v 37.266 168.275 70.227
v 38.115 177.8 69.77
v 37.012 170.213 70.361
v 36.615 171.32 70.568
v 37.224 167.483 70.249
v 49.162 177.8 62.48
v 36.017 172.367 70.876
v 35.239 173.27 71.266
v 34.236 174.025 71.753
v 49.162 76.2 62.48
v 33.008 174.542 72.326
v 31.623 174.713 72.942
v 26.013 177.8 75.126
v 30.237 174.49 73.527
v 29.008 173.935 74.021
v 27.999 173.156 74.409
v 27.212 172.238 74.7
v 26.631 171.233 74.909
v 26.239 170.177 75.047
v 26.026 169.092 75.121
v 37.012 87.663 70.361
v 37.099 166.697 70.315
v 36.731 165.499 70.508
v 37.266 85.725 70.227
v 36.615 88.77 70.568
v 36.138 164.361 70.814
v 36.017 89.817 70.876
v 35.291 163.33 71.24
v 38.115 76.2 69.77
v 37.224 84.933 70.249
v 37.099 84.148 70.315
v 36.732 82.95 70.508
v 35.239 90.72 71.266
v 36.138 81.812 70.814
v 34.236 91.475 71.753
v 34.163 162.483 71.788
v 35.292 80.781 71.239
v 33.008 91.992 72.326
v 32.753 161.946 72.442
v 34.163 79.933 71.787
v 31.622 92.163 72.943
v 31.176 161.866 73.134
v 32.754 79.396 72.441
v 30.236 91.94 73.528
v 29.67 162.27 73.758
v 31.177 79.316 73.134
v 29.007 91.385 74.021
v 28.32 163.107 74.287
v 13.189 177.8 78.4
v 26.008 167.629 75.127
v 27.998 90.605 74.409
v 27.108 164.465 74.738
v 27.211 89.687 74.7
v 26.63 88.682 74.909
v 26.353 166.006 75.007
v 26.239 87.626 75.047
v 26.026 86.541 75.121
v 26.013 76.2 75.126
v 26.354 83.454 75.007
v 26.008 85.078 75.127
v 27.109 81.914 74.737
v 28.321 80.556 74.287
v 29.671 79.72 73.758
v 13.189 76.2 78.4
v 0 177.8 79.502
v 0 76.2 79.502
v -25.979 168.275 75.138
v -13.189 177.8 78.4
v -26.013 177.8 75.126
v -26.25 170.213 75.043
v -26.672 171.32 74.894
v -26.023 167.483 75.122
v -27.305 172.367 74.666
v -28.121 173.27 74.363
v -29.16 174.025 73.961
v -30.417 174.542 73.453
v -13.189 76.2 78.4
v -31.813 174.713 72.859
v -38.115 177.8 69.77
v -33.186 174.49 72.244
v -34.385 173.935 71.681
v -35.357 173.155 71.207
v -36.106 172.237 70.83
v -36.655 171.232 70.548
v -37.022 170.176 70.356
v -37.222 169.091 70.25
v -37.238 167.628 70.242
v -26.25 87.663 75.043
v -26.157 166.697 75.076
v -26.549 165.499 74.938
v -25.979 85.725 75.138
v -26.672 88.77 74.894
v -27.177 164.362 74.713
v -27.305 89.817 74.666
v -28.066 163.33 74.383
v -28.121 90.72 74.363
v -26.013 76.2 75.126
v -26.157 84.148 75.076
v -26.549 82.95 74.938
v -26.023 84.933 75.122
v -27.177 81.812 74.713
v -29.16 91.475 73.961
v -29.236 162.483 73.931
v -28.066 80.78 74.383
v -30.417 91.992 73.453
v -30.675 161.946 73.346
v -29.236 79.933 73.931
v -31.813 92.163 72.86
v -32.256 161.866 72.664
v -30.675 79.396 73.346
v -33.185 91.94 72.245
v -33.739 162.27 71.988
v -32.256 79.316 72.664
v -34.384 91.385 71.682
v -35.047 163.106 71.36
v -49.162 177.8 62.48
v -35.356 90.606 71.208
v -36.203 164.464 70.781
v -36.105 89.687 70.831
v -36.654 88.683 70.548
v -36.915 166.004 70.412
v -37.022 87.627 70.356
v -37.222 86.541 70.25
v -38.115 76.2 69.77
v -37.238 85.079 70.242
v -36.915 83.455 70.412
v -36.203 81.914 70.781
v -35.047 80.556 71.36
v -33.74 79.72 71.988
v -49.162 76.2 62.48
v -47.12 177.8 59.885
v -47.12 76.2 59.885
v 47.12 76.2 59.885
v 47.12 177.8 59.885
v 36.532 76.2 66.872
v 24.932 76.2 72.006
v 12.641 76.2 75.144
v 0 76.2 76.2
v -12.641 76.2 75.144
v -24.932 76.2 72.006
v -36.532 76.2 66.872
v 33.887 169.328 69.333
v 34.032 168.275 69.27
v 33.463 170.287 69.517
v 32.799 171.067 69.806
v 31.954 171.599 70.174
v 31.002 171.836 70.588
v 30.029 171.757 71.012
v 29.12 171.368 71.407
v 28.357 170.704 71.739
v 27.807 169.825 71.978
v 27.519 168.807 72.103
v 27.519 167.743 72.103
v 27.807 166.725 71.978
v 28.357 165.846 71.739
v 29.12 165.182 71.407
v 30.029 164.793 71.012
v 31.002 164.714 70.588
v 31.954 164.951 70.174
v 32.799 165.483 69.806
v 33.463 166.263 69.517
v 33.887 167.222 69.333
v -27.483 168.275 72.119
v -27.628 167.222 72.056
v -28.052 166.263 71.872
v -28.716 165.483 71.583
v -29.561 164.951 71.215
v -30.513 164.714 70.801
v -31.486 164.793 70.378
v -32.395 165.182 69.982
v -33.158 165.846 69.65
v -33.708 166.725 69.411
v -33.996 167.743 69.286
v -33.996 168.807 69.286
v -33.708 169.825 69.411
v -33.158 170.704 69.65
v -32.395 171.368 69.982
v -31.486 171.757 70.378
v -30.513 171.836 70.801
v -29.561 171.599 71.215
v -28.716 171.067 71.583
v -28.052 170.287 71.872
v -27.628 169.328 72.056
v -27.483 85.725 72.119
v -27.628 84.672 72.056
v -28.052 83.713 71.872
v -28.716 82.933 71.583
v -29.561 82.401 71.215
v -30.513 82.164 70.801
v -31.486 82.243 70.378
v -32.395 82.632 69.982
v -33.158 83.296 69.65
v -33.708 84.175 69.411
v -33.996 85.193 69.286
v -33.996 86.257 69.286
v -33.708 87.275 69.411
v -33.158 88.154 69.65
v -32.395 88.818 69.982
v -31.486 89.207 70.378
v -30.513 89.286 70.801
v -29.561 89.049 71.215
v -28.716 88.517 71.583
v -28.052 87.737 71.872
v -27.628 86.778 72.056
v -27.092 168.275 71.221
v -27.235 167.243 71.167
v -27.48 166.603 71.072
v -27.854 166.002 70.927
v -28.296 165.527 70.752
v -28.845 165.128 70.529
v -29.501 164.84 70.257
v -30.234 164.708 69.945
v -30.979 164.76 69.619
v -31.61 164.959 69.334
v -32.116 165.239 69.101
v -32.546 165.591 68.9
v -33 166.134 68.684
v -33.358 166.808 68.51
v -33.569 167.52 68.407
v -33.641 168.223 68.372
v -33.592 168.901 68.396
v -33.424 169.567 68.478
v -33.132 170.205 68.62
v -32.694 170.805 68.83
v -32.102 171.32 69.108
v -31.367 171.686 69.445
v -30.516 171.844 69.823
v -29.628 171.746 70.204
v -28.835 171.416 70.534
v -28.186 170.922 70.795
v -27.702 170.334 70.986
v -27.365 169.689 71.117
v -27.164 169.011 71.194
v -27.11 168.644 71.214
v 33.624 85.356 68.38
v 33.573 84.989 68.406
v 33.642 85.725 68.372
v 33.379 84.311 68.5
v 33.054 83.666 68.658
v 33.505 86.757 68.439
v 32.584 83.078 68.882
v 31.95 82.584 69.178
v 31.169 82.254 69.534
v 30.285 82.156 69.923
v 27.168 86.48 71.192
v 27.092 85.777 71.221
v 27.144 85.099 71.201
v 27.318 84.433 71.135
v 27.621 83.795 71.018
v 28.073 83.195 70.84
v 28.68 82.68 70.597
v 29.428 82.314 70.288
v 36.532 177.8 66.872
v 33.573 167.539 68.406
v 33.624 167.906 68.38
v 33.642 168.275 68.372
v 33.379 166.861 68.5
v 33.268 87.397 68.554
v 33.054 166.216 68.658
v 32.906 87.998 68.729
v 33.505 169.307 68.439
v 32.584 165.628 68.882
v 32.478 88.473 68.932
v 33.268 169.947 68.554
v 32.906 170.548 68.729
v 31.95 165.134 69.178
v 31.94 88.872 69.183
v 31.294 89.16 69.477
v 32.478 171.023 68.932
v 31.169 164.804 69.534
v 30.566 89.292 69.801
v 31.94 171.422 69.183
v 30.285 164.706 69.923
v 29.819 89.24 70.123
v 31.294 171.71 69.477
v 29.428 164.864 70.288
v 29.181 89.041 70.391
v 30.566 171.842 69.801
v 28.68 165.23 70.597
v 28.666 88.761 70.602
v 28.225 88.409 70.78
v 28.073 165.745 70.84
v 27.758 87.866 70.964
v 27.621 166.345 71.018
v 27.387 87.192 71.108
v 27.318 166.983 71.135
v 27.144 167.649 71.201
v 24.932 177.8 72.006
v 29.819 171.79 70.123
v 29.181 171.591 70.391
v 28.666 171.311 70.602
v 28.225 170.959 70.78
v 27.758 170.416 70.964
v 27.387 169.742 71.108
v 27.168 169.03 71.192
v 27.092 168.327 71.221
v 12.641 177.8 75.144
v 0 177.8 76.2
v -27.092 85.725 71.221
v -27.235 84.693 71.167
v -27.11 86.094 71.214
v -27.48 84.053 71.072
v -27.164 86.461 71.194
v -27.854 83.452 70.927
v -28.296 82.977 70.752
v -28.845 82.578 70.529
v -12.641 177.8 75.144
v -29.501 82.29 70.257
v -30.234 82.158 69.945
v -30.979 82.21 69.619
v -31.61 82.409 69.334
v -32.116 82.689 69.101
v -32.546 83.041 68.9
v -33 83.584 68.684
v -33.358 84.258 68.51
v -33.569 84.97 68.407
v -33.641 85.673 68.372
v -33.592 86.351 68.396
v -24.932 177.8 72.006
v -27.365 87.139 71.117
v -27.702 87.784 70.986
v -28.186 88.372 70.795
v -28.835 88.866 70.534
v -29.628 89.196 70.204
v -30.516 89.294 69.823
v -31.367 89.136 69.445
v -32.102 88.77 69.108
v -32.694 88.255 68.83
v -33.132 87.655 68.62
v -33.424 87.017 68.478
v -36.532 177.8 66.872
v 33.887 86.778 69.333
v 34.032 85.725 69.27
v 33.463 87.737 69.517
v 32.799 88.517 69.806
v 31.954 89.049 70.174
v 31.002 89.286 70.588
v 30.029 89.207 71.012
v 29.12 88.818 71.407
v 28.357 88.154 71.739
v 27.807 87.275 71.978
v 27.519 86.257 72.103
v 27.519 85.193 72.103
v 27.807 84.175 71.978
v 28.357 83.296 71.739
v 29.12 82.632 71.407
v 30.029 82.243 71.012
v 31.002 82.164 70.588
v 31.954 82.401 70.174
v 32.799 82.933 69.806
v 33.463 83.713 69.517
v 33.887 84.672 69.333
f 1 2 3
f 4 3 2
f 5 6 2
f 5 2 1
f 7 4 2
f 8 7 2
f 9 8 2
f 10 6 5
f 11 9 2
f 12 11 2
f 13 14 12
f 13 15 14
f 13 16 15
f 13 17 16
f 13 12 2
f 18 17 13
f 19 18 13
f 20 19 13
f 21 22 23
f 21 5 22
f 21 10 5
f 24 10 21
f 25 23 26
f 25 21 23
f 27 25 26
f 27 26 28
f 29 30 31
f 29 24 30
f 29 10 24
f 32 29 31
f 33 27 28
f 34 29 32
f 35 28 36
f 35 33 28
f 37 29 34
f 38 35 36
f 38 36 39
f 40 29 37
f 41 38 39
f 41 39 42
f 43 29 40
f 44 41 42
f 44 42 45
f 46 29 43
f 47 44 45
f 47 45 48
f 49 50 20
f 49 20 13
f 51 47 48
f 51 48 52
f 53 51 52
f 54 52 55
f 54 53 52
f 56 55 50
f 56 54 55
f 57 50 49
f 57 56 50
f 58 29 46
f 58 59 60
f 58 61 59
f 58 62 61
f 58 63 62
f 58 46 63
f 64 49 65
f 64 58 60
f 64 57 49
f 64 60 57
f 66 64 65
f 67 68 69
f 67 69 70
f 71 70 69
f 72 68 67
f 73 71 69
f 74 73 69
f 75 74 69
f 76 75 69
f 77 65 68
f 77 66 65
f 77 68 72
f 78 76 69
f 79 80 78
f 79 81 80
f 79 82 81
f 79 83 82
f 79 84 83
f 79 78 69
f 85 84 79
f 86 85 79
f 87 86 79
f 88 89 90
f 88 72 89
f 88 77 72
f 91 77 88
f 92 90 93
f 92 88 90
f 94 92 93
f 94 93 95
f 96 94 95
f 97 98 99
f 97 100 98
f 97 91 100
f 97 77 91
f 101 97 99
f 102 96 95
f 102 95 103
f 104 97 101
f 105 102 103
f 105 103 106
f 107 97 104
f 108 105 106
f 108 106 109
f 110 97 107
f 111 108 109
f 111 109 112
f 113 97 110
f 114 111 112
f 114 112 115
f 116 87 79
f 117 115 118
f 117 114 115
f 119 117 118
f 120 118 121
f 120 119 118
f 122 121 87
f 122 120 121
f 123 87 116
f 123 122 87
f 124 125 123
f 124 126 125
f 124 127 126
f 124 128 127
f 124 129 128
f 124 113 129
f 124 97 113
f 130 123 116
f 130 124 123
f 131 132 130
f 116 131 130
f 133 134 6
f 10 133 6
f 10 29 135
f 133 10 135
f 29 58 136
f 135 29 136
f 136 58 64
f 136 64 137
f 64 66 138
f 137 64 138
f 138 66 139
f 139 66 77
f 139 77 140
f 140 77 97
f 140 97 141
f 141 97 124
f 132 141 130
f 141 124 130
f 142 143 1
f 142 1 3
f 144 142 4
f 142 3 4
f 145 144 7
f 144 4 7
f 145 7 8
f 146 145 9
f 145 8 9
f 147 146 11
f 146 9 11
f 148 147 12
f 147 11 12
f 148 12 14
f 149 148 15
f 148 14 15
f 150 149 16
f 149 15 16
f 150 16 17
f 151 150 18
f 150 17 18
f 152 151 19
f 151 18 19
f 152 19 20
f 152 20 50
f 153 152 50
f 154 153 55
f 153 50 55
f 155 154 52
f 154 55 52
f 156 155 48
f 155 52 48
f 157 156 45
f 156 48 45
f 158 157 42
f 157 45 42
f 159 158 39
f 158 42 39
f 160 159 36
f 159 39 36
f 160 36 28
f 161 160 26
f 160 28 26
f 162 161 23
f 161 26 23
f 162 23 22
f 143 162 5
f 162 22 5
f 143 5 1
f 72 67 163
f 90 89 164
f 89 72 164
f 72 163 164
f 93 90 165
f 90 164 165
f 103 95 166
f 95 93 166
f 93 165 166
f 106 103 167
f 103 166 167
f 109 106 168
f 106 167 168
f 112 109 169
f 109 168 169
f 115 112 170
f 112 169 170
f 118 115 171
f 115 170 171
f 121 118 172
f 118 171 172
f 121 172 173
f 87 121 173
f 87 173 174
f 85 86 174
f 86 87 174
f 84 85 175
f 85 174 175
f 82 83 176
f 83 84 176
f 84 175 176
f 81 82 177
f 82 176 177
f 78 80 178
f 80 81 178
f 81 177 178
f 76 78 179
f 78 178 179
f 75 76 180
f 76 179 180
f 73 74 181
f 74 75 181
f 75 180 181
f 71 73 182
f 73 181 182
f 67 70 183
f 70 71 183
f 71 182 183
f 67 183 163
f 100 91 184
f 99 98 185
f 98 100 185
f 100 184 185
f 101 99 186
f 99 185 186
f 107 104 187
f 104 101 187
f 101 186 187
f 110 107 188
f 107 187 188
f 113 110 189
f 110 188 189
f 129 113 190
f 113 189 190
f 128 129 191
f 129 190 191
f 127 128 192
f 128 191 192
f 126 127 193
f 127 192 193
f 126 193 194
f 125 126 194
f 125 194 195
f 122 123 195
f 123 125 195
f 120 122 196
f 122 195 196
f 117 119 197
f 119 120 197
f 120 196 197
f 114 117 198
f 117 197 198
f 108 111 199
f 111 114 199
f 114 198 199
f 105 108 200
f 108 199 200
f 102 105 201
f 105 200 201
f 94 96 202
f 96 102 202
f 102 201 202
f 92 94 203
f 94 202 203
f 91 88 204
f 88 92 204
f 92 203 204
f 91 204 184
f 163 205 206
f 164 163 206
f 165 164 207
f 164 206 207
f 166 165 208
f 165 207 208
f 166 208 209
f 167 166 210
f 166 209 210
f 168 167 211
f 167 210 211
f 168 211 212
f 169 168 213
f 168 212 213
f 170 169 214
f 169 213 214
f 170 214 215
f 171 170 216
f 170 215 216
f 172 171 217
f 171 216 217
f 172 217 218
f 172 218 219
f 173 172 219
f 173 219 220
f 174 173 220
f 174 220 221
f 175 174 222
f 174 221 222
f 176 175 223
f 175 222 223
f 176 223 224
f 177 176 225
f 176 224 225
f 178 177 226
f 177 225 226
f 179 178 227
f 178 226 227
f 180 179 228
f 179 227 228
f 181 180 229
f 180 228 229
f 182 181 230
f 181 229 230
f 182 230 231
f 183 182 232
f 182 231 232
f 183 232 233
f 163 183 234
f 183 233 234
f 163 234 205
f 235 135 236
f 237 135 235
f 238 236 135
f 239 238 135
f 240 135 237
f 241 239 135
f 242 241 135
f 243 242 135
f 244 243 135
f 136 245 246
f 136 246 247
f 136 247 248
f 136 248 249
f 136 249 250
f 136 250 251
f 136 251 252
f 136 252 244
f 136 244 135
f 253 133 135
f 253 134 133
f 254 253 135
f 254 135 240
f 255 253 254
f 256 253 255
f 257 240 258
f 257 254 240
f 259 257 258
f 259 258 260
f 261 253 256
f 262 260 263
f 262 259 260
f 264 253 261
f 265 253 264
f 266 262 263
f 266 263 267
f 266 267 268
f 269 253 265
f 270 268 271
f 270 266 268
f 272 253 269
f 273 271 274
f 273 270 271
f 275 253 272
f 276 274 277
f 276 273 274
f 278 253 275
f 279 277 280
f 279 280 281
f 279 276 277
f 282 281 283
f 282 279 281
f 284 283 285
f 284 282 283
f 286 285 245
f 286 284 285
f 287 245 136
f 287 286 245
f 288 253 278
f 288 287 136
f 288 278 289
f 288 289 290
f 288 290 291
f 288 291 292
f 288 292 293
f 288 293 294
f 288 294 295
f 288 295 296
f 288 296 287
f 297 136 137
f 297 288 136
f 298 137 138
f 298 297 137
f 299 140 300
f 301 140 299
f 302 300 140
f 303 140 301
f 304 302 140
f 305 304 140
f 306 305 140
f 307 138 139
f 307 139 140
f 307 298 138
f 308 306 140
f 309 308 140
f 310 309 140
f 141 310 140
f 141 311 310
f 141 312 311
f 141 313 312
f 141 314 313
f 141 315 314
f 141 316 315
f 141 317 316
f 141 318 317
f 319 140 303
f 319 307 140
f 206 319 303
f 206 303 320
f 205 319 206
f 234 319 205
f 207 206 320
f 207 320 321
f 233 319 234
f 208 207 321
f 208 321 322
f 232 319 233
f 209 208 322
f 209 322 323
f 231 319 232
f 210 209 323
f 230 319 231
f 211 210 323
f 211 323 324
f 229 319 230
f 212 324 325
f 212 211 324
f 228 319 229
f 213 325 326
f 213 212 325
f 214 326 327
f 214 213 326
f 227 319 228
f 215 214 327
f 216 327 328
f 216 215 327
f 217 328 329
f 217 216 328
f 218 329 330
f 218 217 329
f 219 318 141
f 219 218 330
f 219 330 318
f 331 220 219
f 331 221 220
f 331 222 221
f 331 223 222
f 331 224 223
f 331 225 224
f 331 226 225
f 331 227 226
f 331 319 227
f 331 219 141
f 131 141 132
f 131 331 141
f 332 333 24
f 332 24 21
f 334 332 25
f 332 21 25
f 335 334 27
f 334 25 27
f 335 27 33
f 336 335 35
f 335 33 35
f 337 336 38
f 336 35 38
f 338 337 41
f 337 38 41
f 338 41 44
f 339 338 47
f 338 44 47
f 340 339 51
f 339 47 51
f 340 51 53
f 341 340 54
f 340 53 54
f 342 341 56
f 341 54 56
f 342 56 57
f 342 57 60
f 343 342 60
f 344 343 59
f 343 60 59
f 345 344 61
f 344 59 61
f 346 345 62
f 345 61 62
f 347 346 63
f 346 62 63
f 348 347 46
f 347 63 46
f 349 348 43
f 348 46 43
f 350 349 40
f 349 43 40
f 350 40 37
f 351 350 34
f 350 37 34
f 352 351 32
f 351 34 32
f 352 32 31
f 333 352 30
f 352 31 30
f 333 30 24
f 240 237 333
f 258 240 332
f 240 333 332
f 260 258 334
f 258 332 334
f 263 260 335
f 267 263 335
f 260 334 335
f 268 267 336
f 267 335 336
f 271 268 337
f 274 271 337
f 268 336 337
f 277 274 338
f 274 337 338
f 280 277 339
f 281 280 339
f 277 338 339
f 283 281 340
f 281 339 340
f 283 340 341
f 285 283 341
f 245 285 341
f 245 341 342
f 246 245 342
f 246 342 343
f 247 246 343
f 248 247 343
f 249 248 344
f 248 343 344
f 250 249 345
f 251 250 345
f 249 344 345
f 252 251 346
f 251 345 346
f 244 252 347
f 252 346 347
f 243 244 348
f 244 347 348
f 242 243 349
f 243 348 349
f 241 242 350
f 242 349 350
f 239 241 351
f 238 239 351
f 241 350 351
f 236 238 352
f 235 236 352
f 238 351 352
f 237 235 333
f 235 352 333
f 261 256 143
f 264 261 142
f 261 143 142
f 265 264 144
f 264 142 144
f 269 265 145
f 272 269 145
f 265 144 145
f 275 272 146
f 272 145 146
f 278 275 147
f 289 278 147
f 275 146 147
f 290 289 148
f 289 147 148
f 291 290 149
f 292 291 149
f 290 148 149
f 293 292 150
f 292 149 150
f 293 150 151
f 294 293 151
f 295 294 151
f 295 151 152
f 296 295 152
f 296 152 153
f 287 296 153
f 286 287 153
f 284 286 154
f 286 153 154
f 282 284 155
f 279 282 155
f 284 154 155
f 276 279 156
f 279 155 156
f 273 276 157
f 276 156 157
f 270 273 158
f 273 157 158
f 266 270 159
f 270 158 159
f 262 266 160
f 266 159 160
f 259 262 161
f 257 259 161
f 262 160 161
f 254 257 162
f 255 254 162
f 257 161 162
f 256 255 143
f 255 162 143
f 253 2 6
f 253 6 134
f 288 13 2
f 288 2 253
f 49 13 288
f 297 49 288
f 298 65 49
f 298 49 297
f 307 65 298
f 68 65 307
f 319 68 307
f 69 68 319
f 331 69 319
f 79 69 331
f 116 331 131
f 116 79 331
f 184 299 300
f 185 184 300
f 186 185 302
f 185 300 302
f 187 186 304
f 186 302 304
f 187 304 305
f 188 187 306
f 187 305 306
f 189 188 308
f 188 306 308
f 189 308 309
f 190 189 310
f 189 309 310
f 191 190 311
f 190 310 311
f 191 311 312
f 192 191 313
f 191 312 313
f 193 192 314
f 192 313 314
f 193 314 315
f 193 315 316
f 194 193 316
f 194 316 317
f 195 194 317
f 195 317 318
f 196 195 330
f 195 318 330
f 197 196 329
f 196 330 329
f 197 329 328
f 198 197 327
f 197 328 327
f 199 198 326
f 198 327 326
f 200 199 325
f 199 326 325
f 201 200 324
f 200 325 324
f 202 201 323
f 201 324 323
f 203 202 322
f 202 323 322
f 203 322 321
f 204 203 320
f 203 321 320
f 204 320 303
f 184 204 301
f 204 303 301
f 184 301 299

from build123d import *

# Parameters (mm, degrees)
SKETCH1_R           = 76.2
SKETCH1_R_2         = 74.549
BOSS_EXTRUDE1_DEPTH = 254
WRAP2_SECTION_W     = 3.302
WRAP2_SECTION_H     = 101.6
WRAP2_ANGLE         = 76.394372684
SKETCH4_W           = 76.2
SKETCH4_H           = 254


# Read off the part's stored shape, not the designer's step: CSK for 1/4 Flat Head Machine Screw (100)1
with BuildPart() as part:
    # Sketch1 → Boss-Extrude1 (new body)
    with BuildSketch(Plane(origin=(0, 0, 0), x_dir=(1, 0, 0), z_dir=(0, 1, 0))):
        with Locations(Location((0, 0, 0), (0, 0, 270))):
            Circle(SKETCH1_R)
        with Locations(Location((0, 0, 0), (0, 0, 270))):
            Circle(SKETCH1_R_2, mode=Mode.SUBTRACT)
    extrude(amount=BOSS_EXTRUDE1_DEPTH)

    # Wrap2 section (on wrap section) → Wrap2 (revolve)
    with BuildSketch(Plane(origin=(0, 0, 0), x_dir=(0.6183698030697371, 0, 0.7858872607769479), z_dir=(0.7858872607769479, 0, -0.6183698030697371))):
        with Locations((77.851, -127)):
            Rectangle(WRAP2_SECTION_W, WRAP2_SECTION_H)
    revolve(axis=Axis((0, 0, 0), (0, -1, 0)), revolution_arc=WRAP2_ANGLE)

    # Sketch4 → Cut-Revolve1 (revolve, cut)
    with BuildSketch(Plane(origin=(0, 0, 0), x_dir=(0, 0, -1), z_dir=(1, 0, 0))):
        with Locations((38.1, 127)):
            Rectangle(SKETCH4_W, SKETCH4_H)
    revolve(axis=Axis((0, 254, 0), (0, -1, 0)), mode=Mode.SUBTRACT)

    # CSK for 1_4 Flat Head Machine Screw  2 → CSK for 1/4 Flat Head Machine Screw (100)1 (revolve, cut)
    with BuildSketch(Plane(origin=(0, 85.725, 0), x_dir=(0.916971382275524, 0, 0.39895298480863006), z_dir=(0, 1, 0))):
        Polygon((0, -79.50211718), (6.43903965, -79.50211718), (3.57124, -77.095747552), (3.57124, -76.116222895), (0, -76.116222895), align=None)
    revolve(axis=Axis((0, 85.725, 0), (0.3989529848086302, 0, -0.9169713822755242)), mode=Mode.SUBTRACT)

    # CSK for 1_4 Flat Head Machine Screw 3 ou → CSK for 1_4 Flat Head Machine Screw  3 (revolve, cut)
    with BuildSketch(Plane(origin=(0, 85.725, 0), x_dir=(0.9169713822755243, 0, -0.3989529848086292), z_dir=(0, -1, 0))):
        Polygon((6.439064088, 79.502137686), (0, 79.502137686), (0, 76.116222895), (3.57124, 76.116222895), (3.57124, 77.095747552), align=None)
    revolve(axis=Axis((0, 85.725, 0), (0.3989529848086292, 0, 0.9169713822755243)), mode=Mode.SUBTRACT)

    # CSK for 1_4 Flat Head Machine Screw 4 ou → CSK for 1_4 Flat Head Machine Screw  4 (revolve, cut)
    with BuildSketch(Plane(origin=(0, 168.275, 0), x_dir=(0.9169713822755243, 0, -0.3989529848086292), z_dir=(0, -1, 0))):
        Polygon((6.439064088, 79.502137686), (0, 79.502137686), (0, 76.116222895), (3.57124, 76.116222895), (3.57124, 77.095747552), align=None)
    revolve(axis=Axis((0, 168.275, 0), (0.3989529848086292, 0, 0.9169713822755243)), mode=Mode.SUBTRACT)

    # CSK for 1_4 Flat Head Machine Screw 5 ou → CSK for 1_4 Flat Head Machine Screw  5 (revolve, cut)
    with BuildSketch(Plane(origin=(0, 168.275, 0), x_dir=(0.916971382275524, 0, 0.39895298480863006), z_dir=(0, 1, 0))):
        Polygon((0, -79.50211718), (6.43903965, -79.50211718), (3.57124, -77.095747552), (3.57124, -76.116222895), (0, -76.116222895), align=None)
    revolve(axis=Axis((0, 168.275, 0), (0.3989529848086302, 0, -0.9169713822755242)), mode=Mode.SUBTRACT)


solid = part.part
